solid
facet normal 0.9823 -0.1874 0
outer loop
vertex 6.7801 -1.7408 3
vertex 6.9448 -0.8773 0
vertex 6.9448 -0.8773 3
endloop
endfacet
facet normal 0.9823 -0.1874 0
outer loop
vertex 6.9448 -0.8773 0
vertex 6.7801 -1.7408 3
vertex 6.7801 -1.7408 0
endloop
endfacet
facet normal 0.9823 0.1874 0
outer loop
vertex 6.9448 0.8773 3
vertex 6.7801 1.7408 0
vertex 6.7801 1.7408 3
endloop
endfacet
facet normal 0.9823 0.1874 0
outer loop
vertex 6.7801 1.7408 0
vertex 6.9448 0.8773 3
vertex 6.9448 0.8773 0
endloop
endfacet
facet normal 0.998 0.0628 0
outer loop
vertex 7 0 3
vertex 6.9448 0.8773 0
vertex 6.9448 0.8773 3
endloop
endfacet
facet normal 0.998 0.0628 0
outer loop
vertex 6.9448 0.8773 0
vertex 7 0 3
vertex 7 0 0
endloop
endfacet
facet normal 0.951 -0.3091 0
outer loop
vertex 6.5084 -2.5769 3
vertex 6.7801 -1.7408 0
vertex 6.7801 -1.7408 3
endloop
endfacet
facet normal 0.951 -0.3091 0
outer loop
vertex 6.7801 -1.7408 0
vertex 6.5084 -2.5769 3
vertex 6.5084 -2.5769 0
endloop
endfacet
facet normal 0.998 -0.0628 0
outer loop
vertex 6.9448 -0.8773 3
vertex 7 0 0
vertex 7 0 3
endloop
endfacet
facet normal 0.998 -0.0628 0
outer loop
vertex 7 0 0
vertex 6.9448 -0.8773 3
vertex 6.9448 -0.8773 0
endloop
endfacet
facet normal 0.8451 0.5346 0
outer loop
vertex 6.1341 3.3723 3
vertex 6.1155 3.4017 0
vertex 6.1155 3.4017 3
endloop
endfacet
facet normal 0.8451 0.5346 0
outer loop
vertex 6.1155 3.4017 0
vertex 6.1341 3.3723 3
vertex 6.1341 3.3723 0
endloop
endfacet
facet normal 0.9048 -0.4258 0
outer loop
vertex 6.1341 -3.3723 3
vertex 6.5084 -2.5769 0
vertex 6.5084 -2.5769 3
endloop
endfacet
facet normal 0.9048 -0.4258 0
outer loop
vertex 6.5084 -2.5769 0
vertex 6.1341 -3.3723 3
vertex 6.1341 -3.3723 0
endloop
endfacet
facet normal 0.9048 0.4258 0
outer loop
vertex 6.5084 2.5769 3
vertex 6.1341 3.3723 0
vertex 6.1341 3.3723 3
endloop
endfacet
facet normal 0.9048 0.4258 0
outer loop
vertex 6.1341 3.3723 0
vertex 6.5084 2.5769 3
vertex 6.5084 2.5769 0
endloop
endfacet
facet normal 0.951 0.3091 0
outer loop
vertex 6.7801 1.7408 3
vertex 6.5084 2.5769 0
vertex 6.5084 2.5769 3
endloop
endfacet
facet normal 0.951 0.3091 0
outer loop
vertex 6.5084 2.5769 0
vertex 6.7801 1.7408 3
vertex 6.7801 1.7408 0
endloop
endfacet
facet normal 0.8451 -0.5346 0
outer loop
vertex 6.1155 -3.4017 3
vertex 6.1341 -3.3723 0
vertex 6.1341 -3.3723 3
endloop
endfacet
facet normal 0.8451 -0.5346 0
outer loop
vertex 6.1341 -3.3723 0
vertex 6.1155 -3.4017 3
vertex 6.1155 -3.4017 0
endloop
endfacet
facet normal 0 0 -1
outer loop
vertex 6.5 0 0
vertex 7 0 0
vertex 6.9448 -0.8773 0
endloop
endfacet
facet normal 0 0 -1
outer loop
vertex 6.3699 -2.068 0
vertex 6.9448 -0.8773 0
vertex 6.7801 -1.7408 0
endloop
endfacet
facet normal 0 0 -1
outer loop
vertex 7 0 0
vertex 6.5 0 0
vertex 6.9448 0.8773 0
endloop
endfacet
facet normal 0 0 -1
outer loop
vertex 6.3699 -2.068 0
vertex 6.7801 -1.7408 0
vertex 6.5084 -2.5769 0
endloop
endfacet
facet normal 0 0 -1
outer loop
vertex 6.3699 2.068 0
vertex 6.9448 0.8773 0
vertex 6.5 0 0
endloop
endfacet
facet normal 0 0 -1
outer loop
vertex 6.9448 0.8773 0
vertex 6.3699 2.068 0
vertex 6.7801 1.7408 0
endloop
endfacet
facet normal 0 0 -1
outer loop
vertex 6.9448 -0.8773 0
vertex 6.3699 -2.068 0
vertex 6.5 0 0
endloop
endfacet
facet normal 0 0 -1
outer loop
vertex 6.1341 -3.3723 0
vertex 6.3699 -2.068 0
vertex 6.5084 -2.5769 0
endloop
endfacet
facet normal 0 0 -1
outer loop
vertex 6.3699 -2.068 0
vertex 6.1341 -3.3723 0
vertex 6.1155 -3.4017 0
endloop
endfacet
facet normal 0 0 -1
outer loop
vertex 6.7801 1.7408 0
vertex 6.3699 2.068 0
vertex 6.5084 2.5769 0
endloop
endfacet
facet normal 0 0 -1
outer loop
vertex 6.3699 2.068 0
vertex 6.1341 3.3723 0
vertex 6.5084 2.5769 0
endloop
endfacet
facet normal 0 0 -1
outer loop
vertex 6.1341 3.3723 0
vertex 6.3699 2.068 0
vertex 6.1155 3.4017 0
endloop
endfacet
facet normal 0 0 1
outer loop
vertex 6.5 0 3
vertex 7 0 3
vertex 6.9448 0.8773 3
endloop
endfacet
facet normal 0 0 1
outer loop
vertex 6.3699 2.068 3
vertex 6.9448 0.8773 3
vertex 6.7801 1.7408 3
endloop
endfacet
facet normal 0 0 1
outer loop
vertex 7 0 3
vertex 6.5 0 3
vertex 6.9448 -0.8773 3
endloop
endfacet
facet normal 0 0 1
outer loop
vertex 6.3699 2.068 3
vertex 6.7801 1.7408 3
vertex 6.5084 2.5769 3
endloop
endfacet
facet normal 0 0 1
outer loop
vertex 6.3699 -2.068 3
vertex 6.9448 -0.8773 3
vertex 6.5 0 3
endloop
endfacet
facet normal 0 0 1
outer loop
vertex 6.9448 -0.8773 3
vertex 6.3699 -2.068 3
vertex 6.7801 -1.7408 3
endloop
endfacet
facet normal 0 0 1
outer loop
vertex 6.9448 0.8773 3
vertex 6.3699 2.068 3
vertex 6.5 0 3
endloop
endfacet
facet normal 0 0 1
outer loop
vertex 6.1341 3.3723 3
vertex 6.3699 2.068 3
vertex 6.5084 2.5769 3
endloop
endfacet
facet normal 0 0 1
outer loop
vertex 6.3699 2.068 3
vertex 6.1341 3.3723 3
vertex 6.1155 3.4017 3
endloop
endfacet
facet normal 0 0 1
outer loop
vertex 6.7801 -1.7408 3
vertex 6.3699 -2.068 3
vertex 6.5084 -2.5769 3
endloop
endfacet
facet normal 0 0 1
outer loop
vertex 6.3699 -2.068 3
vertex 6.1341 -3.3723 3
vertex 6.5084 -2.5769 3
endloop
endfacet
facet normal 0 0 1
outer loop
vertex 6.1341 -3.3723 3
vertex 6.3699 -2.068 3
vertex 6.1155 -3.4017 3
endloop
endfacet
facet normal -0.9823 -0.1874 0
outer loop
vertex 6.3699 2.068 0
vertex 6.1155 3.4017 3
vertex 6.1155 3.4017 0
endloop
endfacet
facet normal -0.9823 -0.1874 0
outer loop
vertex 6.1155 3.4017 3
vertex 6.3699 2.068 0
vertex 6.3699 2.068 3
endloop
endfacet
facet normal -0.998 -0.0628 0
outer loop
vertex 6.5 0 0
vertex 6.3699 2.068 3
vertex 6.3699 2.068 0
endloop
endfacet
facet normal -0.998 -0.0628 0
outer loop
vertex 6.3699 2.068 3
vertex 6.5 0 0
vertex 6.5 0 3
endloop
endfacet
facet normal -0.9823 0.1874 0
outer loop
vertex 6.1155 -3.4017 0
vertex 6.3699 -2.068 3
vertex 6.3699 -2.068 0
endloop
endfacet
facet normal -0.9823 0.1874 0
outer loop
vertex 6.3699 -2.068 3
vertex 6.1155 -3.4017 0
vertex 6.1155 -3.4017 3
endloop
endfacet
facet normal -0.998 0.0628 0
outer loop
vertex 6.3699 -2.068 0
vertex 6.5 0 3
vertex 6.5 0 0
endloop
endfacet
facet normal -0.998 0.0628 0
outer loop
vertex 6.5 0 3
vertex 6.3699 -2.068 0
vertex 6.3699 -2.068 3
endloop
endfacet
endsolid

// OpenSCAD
$fn = 50;


difference() {
	union() {
		cylinder(h = 3, r = 7.0000000000);
		translate(v = [-13.0000000000, 0, 0]) {
			cylinder(h = 3, r = 7.0000000000);
		}
	}
	union() {
		cylinder(h = 3, r = 3.2500000000);
		cylinder(h = 3, r = 1.8000000000);
		cylinder(h = 3, r = 1.8000000000);
		cylinder(h = 3, r = 1.8000000000);
		translate(v = [-17.5000000000, 0, 0]) {
			hull() {
				translate(v = [-3.7500000000, 0.0000000000, 0]) {
					cylinder(h = 3, r = 10.5000000000);
				}
				translate(v = [3.7500000000, 0.0000000000, 0]) {
					cylinder(h = 3, r = 10.5000000000);
				}
				translate(v = [-3.7500000000, -0.0000000000, 0]) {
					cylinder(h = 3, r = 10.5000000000);
				}
				translate(v = [3.7500000000, -0.0000000000, 0]) {
					cylinder(h = 3, r = 10.5000000000);
				}
			}
		}
		translate(v = [-10.0000000000, 0, 0.0000000000]) {
			cylinder(h = 3, r = 16.5000000000);
		}
	}
}
